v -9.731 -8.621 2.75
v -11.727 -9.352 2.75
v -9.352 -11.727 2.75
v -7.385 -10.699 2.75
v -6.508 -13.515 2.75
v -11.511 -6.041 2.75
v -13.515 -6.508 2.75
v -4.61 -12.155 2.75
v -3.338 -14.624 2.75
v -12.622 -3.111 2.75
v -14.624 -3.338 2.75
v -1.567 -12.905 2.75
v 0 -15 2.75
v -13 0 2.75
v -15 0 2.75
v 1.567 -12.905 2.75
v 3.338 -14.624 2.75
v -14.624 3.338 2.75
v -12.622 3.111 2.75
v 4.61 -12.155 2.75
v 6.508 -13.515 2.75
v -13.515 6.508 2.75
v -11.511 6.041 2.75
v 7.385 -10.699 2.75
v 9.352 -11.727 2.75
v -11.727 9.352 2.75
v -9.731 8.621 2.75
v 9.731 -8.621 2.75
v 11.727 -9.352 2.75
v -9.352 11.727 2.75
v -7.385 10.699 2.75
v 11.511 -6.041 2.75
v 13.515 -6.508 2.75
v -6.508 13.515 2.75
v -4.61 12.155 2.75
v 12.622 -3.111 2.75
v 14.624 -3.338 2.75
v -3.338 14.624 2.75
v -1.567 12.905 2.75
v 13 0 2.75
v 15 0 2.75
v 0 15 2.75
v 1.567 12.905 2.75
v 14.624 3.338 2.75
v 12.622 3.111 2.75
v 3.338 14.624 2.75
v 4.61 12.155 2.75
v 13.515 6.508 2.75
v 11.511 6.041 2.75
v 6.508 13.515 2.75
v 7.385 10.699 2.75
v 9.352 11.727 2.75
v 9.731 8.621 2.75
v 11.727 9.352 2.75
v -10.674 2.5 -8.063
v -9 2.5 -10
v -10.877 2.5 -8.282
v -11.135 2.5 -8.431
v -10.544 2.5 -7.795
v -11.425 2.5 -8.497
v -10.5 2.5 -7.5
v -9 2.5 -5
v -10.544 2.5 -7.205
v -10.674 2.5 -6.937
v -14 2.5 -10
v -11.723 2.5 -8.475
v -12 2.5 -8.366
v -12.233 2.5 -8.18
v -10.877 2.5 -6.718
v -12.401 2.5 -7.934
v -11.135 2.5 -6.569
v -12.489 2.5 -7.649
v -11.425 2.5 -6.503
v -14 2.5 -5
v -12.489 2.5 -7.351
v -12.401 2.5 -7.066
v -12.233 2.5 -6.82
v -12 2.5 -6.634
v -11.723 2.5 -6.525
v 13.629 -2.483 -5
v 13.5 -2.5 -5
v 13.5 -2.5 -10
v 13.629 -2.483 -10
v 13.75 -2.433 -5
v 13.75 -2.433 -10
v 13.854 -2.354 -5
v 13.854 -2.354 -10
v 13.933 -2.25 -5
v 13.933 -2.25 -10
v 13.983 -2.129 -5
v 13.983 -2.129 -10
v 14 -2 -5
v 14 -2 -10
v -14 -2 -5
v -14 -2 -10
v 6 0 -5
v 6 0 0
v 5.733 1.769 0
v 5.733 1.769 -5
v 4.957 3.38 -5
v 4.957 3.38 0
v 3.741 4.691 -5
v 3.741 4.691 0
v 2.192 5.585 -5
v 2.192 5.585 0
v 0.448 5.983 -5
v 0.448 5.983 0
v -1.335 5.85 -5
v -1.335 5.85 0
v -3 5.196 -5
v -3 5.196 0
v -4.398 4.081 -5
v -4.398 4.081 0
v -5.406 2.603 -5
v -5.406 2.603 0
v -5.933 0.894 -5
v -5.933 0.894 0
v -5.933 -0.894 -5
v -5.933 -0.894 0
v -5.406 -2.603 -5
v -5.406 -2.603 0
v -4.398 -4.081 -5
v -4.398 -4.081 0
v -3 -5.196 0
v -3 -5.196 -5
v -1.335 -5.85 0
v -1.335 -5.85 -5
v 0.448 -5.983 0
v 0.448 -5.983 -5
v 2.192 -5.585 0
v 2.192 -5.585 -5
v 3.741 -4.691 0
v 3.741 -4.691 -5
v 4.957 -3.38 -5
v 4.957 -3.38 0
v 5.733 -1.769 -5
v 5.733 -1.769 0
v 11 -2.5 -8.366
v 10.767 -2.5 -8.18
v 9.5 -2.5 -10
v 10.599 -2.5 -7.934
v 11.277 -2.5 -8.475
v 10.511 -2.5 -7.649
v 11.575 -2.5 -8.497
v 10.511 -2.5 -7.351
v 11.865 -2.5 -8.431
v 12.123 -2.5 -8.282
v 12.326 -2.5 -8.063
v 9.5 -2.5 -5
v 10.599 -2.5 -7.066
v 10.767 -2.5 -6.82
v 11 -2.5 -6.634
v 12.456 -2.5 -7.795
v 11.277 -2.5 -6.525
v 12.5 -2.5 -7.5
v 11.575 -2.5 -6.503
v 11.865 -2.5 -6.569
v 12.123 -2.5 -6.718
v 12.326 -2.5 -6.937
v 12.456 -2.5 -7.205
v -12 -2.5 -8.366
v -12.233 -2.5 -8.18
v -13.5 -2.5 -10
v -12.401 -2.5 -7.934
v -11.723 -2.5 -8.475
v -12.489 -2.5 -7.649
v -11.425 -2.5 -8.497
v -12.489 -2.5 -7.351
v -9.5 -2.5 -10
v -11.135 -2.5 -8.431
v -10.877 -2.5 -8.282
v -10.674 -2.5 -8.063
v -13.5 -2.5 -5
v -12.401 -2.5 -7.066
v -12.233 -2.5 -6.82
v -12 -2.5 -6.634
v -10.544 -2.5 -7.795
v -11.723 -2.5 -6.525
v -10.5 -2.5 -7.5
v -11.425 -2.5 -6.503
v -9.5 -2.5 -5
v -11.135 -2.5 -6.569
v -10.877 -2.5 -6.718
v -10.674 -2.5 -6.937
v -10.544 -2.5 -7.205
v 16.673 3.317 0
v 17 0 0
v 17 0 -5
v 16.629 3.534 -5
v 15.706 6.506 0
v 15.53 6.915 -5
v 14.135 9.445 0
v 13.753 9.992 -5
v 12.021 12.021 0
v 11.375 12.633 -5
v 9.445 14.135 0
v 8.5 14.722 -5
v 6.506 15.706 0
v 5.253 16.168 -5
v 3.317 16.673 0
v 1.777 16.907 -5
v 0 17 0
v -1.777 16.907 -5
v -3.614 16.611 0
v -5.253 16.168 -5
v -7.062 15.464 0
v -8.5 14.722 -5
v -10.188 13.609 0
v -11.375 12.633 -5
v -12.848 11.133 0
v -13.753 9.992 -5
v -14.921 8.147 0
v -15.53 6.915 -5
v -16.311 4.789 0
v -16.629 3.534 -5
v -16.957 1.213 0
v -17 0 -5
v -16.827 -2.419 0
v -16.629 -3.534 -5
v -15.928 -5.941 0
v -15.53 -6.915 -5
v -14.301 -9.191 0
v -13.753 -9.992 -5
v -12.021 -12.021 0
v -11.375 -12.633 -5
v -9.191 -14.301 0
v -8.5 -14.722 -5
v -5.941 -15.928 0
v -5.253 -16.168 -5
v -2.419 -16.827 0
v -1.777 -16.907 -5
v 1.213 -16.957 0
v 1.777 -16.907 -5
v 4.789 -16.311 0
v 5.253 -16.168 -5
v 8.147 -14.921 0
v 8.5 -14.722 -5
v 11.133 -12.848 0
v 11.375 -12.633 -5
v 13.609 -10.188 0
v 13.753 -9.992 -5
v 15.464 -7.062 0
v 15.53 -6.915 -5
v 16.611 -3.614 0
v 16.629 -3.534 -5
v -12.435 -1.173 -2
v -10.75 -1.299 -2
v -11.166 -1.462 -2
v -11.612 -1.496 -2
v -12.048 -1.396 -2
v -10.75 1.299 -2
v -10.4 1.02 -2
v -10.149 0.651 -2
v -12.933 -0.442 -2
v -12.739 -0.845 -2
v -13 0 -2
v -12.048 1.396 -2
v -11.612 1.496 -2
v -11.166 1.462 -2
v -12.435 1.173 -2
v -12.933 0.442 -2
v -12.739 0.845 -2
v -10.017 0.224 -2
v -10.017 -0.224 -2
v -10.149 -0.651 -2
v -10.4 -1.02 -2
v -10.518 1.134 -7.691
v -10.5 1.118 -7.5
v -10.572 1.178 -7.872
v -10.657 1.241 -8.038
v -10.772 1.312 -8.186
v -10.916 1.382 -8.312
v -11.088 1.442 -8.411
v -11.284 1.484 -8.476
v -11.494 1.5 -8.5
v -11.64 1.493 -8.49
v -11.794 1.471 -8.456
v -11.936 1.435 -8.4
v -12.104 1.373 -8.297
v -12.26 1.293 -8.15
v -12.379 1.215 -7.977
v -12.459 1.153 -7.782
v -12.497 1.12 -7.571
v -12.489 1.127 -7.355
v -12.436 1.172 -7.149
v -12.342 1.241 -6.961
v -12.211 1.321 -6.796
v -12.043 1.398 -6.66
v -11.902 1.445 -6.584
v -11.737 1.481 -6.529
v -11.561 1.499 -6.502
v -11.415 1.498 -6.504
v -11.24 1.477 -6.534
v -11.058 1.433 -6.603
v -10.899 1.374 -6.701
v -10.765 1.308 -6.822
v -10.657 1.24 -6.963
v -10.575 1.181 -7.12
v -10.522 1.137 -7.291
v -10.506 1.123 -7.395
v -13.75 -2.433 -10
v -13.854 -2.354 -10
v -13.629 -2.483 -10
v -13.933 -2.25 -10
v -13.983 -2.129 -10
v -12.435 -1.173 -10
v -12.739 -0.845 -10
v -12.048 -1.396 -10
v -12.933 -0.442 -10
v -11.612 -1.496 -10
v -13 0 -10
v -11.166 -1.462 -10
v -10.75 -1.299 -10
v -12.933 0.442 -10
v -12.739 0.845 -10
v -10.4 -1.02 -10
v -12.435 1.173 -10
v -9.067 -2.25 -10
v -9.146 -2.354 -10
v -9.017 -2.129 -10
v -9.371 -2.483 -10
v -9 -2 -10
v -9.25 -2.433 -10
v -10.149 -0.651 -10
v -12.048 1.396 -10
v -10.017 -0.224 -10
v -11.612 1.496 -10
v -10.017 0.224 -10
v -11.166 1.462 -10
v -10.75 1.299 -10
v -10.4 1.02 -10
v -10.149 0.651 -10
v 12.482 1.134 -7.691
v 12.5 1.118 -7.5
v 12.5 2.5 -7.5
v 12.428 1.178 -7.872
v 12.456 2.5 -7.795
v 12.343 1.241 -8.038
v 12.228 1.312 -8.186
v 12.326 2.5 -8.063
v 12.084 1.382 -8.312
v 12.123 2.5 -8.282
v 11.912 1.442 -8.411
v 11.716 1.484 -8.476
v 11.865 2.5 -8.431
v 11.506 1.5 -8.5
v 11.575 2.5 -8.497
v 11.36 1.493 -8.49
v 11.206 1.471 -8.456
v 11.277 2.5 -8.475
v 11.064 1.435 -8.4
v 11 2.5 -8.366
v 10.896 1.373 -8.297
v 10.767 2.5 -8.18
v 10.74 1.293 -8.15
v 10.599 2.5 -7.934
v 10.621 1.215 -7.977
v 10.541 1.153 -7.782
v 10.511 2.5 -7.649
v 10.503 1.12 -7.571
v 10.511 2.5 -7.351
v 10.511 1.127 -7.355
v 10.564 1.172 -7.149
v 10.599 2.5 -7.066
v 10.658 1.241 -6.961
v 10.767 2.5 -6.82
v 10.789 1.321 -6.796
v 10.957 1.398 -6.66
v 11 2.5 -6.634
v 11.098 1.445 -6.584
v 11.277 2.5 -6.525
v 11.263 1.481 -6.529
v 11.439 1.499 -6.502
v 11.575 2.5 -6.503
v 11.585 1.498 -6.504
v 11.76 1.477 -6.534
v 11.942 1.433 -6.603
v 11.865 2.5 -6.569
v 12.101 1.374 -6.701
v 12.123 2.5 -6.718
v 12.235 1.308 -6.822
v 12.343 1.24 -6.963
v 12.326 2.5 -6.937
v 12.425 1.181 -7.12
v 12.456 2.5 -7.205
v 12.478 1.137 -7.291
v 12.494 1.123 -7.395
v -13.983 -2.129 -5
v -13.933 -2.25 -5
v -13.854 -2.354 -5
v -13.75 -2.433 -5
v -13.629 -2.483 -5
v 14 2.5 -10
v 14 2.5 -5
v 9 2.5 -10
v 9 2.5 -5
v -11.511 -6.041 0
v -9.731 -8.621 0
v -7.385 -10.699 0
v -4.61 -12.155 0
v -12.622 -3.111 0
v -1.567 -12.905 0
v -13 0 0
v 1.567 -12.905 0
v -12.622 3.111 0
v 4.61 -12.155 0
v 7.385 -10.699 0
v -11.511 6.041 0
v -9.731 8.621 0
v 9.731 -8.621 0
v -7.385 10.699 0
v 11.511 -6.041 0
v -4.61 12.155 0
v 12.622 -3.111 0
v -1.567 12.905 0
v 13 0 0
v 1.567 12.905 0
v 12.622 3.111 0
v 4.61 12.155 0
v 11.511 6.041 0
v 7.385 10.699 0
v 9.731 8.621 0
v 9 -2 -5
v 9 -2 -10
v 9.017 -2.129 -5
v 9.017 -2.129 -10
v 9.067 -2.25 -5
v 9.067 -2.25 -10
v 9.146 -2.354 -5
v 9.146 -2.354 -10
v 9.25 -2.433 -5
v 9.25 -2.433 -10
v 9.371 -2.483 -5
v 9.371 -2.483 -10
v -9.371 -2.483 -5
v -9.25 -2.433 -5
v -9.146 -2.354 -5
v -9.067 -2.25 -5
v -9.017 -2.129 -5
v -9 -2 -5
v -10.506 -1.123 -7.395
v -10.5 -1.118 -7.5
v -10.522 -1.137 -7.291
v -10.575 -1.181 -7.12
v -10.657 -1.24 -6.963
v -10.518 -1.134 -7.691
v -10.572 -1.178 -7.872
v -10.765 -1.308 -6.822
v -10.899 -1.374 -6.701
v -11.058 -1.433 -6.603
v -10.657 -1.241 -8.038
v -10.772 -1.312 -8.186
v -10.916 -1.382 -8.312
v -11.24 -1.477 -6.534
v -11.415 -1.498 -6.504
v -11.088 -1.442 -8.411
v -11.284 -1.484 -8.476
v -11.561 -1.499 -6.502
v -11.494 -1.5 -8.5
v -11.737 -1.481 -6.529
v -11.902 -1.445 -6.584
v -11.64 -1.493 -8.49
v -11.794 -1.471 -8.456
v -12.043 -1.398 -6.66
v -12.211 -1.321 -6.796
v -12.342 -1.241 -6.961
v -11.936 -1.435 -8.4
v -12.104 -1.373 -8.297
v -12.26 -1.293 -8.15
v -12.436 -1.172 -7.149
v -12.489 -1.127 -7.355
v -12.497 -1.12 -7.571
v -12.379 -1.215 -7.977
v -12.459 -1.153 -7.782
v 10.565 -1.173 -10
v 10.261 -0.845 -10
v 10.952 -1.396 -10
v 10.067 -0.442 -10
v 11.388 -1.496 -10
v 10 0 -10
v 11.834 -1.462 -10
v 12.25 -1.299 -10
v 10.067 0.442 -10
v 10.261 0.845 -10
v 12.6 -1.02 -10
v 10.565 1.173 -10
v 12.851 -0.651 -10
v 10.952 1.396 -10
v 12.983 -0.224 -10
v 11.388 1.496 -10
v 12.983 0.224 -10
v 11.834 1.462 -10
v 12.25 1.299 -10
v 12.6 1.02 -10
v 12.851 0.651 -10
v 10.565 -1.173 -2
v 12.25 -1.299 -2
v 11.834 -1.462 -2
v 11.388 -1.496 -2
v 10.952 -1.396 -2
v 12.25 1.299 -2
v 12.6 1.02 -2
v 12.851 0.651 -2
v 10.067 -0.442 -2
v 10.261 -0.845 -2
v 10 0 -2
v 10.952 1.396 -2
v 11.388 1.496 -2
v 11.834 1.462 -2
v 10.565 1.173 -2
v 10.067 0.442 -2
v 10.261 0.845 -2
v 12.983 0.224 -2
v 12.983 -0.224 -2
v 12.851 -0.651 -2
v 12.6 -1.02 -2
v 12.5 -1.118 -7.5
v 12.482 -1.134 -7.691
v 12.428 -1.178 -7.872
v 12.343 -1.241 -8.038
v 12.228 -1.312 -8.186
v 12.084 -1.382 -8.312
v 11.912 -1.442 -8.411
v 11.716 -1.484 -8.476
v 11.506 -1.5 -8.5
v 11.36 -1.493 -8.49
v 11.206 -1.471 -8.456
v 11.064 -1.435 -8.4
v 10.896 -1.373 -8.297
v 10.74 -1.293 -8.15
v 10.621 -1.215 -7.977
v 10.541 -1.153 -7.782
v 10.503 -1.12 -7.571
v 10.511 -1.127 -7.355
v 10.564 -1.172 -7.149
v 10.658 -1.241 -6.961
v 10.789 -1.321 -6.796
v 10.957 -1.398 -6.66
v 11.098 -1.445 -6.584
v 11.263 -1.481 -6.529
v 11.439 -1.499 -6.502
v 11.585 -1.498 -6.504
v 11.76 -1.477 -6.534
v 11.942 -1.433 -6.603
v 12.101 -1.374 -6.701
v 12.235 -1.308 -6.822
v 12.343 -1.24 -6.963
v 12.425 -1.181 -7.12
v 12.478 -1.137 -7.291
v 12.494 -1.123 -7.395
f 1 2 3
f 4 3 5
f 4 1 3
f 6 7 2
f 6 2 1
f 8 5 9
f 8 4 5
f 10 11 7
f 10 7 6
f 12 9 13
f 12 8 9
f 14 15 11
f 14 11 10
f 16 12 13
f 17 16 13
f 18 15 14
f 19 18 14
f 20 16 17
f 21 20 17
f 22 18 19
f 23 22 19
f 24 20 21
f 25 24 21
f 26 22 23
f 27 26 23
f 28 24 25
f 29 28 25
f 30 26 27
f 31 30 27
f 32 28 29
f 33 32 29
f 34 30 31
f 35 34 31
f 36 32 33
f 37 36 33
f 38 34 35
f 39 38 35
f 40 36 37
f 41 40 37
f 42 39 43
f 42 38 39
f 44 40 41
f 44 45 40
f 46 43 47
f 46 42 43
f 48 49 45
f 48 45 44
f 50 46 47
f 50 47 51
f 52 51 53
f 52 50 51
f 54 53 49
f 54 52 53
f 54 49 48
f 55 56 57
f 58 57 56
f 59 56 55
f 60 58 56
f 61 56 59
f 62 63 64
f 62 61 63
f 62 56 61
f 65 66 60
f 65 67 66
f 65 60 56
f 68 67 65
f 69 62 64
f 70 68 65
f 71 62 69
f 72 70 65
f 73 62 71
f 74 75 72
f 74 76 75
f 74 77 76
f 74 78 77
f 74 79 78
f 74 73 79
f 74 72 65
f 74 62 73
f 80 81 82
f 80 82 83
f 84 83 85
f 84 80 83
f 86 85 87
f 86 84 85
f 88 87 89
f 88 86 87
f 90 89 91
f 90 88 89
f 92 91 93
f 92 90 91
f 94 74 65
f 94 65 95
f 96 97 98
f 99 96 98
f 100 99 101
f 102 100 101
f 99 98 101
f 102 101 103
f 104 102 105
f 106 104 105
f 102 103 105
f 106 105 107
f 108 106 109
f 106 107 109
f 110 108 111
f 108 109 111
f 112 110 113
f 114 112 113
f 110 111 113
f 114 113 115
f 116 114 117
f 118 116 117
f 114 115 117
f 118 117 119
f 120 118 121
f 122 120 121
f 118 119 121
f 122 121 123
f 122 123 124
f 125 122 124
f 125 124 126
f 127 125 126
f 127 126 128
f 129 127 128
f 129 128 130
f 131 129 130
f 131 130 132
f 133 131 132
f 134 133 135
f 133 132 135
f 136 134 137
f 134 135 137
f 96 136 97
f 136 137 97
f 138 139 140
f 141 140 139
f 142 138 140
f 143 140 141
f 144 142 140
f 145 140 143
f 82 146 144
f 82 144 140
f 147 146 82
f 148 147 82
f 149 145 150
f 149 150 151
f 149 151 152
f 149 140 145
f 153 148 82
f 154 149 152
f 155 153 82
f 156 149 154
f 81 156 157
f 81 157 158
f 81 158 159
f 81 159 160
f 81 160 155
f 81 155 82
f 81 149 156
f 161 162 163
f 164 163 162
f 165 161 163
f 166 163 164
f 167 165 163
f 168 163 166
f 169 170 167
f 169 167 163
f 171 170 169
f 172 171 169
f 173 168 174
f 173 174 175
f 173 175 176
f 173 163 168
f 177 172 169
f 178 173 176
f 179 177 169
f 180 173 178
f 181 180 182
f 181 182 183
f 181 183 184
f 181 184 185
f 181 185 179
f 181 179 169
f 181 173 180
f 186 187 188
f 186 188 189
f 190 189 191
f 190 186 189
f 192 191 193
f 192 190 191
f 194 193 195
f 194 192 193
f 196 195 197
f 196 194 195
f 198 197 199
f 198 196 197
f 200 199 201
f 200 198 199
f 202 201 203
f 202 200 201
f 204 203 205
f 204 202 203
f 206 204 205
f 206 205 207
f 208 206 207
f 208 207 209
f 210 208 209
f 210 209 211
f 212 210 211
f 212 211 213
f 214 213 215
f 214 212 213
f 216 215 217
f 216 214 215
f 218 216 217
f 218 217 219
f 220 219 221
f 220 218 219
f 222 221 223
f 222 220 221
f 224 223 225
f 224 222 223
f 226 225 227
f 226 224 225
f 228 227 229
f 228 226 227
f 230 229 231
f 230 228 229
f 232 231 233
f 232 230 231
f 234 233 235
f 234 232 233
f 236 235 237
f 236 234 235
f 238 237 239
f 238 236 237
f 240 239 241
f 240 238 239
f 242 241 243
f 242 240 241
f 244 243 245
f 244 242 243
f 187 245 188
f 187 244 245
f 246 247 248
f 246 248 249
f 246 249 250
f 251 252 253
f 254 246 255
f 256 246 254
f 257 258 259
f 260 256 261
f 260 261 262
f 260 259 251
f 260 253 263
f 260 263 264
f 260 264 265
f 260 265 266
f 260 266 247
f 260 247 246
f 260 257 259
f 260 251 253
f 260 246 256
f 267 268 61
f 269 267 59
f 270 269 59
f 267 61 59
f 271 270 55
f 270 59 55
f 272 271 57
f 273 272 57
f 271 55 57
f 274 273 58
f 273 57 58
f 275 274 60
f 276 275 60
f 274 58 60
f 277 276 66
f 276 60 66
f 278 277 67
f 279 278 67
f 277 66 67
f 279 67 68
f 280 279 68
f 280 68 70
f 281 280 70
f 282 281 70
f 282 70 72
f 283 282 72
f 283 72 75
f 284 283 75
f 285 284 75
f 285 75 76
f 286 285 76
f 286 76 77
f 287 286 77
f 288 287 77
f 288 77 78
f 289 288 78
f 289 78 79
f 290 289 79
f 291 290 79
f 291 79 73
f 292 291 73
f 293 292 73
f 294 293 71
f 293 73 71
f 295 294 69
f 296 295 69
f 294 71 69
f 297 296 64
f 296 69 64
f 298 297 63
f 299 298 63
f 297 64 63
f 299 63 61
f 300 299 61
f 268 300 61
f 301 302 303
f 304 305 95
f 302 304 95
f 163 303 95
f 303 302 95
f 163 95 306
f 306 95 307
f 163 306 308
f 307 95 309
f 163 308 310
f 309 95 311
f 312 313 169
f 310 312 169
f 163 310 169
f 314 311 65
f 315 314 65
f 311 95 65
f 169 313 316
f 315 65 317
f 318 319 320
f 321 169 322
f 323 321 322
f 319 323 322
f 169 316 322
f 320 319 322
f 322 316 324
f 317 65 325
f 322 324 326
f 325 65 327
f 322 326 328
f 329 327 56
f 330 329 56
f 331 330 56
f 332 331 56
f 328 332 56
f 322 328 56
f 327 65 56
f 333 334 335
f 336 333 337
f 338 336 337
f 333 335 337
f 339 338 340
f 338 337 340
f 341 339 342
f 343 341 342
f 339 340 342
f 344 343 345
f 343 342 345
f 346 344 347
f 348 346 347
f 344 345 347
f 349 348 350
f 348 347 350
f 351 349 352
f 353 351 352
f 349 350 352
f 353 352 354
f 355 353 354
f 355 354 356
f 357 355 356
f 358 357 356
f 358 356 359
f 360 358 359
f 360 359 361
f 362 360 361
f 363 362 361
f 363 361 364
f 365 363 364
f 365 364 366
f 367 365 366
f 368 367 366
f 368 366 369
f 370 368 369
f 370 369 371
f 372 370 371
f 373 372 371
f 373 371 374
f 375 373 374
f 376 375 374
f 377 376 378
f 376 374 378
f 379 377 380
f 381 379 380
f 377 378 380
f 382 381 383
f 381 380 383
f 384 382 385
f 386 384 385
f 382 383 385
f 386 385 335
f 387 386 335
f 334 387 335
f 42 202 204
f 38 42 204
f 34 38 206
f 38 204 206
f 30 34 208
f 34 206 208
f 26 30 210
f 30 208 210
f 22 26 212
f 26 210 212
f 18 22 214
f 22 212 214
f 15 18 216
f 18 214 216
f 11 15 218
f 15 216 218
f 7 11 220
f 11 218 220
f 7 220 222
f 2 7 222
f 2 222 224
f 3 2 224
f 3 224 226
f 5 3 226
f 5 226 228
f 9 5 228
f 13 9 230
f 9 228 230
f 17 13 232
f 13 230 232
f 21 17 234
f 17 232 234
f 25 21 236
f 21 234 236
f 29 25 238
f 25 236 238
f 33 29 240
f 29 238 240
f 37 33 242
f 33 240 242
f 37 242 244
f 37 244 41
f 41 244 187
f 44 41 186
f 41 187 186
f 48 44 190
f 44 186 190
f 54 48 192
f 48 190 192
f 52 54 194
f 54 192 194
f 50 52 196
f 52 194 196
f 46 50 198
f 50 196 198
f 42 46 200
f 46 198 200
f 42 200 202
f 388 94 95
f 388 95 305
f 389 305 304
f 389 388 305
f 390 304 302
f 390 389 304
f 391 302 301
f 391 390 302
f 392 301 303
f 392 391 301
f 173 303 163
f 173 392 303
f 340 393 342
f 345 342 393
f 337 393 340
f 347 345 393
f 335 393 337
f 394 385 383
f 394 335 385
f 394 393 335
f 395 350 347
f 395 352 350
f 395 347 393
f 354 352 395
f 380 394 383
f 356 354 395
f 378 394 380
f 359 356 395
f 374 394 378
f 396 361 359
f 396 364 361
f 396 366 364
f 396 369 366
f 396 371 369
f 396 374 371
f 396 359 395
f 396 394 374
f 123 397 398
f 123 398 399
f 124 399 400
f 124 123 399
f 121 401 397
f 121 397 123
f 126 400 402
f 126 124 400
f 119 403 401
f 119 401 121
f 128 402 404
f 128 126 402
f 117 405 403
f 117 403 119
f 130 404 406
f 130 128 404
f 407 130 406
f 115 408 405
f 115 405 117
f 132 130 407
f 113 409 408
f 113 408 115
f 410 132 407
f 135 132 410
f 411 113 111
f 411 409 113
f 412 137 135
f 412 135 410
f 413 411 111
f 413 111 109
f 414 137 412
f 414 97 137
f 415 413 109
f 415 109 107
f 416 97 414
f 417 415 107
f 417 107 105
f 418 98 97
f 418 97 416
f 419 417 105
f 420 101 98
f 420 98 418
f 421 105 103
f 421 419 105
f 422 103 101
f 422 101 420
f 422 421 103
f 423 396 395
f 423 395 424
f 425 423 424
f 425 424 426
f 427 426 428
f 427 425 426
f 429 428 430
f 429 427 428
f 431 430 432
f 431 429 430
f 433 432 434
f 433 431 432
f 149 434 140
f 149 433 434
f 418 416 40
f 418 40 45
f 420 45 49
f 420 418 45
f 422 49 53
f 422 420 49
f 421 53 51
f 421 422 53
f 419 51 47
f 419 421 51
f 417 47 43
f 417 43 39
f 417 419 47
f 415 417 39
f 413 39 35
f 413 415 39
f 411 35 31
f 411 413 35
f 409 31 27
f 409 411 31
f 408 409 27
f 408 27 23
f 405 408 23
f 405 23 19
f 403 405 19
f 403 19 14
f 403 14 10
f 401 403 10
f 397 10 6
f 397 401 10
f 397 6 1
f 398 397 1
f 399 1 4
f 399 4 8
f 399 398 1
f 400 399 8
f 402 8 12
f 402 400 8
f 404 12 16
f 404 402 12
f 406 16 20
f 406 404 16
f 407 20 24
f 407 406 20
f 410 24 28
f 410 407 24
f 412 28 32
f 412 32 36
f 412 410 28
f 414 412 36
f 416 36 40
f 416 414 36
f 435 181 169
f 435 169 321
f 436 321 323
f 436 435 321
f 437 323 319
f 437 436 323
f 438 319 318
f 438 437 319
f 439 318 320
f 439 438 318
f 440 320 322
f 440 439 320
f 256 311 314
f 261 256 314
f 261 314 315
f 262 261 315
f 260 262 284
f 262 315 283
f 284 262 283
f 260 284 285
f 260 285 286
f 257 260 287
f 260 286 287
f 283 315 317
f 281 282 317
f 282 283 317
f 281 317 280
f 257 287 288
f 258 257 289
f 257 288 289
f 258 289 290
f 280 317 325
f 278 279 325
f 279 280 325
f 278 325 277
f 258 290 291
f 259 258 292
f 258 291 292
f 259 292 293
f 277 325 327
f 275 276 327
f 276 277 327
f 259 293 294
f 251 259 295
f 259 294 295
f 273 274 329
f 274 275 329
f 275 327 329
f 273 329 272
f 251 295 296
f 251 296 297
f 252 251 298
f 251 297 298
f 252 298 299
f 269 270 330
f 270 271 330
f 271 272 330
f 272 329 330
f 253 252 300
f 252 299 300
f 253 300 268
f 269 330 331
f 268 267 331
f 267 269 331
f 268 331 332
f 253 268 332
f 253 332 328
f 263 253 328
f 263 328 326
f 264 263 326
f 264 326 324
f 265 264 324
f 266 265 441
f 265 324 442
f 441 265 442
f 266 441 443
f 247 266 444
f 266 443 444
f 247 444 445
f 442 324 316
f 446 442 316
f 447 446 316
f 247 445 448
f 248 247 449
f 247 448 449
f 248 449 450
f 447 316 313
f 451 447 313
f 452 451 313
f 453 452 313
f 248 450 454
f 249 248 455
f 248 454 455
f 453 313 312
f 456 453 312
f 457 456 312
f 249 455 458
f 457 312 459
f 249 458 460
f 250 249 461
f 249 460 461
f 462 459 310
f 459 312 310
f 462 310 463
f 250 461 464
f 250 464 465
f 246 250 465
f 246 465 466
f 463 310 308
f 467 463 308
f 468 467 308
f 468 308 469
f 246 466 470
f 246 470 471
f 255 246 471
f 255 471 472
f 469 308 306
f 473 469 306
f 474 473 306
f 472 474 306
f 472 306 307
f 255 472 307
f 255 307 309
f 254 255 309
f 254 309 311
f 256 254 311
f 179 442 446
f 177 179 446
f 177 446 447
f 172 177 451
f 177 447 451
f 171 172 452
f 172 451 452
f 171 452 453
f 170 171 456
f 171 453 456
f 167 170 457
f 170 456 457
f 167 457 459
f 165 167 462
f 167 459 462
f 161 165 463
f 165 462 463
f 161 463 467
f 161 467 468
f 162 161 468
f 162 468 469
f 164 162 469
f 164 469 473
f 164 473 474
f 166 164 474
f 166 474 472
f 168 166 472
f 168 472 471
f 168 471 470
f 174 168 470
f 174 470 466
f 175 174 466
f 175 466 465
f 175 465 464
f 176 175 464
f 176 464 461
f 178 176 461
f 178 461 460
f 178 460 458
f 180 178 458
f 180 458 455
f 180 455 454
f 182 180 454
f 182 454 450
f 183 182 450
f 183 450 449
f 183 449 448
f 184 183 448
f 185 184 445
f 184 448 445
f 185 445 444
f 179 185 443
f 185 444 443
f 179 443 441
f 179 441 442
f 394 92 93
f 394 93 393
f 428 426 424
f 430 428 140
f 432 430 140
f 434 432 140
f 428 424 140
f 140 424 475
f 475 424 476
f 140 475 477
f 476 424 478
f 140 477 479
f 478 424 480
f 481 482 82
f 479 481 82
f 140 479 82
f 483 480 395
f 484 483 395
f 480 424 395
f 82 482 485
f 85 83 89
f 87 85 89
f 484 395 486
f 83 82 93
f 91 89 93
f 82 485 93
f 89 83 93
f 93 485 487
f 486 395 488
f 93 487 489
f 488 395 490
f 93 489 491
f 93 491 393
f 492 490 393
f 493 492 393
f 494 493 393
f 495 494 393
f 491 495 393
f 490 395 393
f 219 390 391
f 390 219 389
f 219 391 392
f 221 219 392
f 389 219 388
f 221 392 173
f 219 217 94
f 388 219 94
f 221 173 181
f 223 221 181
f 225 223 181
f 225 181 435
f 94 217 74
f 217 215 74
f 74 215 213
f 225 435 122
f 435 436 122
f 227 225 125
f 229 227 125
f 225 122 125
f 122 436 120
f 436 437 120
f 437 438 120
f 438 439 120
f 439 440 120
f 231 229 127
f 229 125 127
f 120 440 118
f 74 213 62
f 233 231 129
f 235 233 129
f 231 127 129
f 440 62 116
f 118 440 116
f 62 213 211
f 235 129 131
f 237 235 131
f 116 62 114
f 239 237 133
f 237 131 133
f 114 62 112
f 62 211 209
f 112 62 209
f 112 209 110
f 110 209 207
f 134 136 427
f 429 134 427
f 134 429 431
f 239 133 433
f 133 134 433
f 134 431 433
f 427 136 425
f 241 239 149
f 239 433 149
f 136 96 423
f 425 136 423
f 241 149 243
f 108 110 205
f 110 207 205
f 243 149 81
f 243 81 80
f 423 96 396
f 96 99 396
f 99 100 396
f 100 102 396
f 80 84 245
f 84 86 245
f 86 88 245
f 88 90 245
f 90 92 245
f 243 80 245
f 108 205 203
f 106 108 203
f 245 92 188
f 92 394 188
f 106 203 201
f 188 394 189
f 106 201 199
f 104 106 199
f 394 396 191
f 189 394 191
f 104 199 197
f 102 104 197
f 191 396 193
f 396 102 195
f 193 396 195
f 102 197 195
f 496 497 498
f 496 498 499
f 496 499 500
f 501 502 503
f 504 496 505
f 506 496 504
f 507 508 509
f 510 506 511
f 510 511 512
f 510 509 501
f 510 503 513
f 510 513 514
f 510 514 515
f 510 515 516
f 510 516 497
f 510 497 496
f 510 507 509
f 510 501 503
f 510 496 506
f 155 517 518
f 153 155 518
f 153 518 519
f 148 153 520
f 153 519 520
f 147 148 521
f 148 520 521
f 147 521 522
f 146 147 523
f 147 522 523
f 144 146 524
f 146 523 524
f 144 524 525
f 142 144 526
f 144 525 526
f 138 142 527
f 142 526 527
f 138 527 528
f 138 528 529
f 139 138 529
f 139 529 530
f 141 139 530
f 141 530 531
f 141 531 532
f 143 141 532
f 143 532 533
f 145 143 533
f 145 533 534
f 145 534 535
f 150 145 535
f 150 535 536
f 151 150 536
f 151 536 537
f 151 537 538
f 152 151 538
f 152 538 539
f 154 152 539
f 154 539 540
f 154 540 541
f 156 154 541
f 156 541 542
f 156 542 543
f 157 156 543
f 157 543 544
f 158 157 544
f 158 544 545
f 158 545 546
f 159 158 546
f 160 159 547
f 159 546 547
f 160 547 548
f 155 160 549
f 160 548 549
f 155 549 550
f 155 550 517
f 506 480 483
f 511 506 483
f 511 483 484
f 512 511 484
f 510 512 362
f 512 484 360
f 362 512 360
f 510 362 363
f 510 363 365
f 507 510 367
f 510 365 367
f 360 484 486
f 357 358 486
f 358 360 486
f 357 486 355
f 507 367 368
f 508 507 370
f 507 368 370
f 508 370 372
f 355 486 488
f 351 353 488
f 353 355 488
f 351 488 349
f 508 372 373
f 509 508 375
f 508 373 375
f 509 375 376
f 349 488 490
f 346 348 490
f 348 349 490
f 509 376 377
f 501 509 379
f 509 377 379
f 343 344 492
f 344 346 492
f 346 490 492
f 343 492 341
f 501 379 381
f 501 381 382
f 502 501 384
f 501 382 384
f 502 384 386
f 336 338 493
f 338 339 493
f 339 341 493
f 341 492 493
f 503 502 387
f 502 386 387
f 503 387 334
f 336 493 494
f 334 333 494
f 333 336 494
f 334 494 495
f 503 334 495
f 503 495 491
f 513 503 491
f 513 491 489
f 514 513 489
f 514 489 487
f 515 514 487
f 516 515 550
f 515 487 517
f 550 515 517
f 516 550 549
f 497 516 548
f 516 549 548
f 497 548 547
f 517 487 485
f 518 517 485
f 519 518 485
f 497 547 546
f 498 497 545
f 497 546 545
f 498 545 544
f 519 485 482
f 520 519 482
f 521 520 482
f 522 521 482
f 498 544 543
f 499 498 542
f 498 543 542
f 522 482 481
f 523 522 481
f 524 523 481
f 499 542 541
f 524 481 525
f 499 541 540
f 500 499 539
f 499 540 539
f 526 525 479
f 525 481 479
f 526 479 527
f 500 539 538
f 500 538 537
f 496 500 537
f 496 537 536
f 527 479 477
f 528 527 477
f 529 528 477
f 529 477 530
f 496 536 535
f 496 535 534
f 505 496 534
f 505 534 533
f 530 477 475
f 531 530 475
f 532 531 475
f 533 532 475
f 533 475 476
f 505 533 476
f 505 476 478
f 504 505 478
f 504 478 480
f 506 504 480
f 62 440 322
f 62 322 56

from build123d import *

# Parameters (mm, degrees)
SKETCH1_R           = 17
SKETCH1_R_2         = 6
BOSS_EXTRUDE1_DEPTH = 5
SKETCH2_R           = 15
SKETCH2_R_2         = 13
BOSS_EXTRUDE2_DEPTH = 2.75
BOSS_EXTRUDE4_DEPTH = 5
SKETCH5_R           = 1
CUT_EXTRUDE1_DEPTH  = 20.5
SKETCH6_R           = 1.5
CUT_EXTRUDE2_DEPTH  = 8


with BuildPart() as part:
    # Sketch1 → Boss-Extrude1 (new body)
    with BuildSketch(Plane.XY):
        Circle(SKETCH1_R)
        Circle(SKETCH1_R_2, mode=Mode.SUBTRACT)
    extrude(amount=-BOSS_EXTRUDE1_DEPTH)

    # Sketch2 → Boss-Extrude2 (add)
    with BuildSketch(Plane.XY):
        Circle(SKETCH2_R)
        Circle(SKETCH2_R_2, mode=Mode.SUBTRACT)
    extrude(amount=BOSS_EXTRUDE2_DEPTH)

    # Sketch3 → Revolve1 (revolve)
    with BuildSketch(Plane(origin=(0, 0, 0), x_dir=(0, 0, -1), z_dir=(1, 0, 0))):
        Polygon((-2.75, 15), (0, 17), (0, 15), align=None)
    revolve(axis=Axis((0, 0, 0), (0, 0, 1)))

    # Sketch4 → Boss-Extrude4 (add)
    with BuildSketch(Plane(origin=(0, 0, -5), x_dir=(-1, 0, 0), z_dir=(0, 0, -1))):
        with BuildLine():
            Line((-14, 2.5), (-9, 2.5))
            Line((-9, 2.5), (-9, -2))
            ThreePointArc((-9, -2), (-9.146446609, -2.353553391), (-9.5, -2.5))
            Line((-9.5, -2.5), (-13.5, -2.5))
            ThreePointArc((-13.5, -2.5), (-13.853553391, -2.353553391), (-14, -2))
            Line((-14, -2), (-14, 2.5))
        make_face()
        with BuildLine():
            Line((13.5, -2.5), (9.5, -2.5))
            ThreePointArc((9.5, -2.5), (9.146446609, -2.353553391), (9, -2))
            Line((9, -2), (9, 2.5))
            Line((9, 2.5), (14, 2.5))
            Line((14, 2.5), (14, -2))
            ThreePointArc((14, -2), (13.853553391, -2.353553391), (13.5, -2.5))
        make_face()
    extrude(amount=BOSS_EXTRUDE4_DEPTH)

    # Sketch5 → Cut-Extrude1 (cut, through all)
    with BuildSketch(Plane(origin=(0, 2.5, 0), x_dir=(1, 0, 0), z_dir=(0, 1, 0))):
        with Locations((11.5, 7.5)):
            Circle(SKETCH5_R)
        with Locations((-11.5, 7.5)):
            Circle(SKETCH5_R)
    extrude(amount=-CUT_EXTRUDE1_DEPTH, mode=Mode.SUBTRACT)

    # Sketch6 → Cut-Extrude2 (cut)
    with BuildSketch(Plane(origin=(0, 0, -10), x_dir=(-1, 0, 0), z_dir=(0, 0, -1))):
        with Locations((-11.5, 0)):
            Circle(SKETCH6_R)
        with Locations((11.5, 0)):
            Circle(SKETCH6_R)
    extrude(amount=-CUT_EXTRUDE2_DEPTH, mode=Mode.SUBTRACT)


solid = part.part
